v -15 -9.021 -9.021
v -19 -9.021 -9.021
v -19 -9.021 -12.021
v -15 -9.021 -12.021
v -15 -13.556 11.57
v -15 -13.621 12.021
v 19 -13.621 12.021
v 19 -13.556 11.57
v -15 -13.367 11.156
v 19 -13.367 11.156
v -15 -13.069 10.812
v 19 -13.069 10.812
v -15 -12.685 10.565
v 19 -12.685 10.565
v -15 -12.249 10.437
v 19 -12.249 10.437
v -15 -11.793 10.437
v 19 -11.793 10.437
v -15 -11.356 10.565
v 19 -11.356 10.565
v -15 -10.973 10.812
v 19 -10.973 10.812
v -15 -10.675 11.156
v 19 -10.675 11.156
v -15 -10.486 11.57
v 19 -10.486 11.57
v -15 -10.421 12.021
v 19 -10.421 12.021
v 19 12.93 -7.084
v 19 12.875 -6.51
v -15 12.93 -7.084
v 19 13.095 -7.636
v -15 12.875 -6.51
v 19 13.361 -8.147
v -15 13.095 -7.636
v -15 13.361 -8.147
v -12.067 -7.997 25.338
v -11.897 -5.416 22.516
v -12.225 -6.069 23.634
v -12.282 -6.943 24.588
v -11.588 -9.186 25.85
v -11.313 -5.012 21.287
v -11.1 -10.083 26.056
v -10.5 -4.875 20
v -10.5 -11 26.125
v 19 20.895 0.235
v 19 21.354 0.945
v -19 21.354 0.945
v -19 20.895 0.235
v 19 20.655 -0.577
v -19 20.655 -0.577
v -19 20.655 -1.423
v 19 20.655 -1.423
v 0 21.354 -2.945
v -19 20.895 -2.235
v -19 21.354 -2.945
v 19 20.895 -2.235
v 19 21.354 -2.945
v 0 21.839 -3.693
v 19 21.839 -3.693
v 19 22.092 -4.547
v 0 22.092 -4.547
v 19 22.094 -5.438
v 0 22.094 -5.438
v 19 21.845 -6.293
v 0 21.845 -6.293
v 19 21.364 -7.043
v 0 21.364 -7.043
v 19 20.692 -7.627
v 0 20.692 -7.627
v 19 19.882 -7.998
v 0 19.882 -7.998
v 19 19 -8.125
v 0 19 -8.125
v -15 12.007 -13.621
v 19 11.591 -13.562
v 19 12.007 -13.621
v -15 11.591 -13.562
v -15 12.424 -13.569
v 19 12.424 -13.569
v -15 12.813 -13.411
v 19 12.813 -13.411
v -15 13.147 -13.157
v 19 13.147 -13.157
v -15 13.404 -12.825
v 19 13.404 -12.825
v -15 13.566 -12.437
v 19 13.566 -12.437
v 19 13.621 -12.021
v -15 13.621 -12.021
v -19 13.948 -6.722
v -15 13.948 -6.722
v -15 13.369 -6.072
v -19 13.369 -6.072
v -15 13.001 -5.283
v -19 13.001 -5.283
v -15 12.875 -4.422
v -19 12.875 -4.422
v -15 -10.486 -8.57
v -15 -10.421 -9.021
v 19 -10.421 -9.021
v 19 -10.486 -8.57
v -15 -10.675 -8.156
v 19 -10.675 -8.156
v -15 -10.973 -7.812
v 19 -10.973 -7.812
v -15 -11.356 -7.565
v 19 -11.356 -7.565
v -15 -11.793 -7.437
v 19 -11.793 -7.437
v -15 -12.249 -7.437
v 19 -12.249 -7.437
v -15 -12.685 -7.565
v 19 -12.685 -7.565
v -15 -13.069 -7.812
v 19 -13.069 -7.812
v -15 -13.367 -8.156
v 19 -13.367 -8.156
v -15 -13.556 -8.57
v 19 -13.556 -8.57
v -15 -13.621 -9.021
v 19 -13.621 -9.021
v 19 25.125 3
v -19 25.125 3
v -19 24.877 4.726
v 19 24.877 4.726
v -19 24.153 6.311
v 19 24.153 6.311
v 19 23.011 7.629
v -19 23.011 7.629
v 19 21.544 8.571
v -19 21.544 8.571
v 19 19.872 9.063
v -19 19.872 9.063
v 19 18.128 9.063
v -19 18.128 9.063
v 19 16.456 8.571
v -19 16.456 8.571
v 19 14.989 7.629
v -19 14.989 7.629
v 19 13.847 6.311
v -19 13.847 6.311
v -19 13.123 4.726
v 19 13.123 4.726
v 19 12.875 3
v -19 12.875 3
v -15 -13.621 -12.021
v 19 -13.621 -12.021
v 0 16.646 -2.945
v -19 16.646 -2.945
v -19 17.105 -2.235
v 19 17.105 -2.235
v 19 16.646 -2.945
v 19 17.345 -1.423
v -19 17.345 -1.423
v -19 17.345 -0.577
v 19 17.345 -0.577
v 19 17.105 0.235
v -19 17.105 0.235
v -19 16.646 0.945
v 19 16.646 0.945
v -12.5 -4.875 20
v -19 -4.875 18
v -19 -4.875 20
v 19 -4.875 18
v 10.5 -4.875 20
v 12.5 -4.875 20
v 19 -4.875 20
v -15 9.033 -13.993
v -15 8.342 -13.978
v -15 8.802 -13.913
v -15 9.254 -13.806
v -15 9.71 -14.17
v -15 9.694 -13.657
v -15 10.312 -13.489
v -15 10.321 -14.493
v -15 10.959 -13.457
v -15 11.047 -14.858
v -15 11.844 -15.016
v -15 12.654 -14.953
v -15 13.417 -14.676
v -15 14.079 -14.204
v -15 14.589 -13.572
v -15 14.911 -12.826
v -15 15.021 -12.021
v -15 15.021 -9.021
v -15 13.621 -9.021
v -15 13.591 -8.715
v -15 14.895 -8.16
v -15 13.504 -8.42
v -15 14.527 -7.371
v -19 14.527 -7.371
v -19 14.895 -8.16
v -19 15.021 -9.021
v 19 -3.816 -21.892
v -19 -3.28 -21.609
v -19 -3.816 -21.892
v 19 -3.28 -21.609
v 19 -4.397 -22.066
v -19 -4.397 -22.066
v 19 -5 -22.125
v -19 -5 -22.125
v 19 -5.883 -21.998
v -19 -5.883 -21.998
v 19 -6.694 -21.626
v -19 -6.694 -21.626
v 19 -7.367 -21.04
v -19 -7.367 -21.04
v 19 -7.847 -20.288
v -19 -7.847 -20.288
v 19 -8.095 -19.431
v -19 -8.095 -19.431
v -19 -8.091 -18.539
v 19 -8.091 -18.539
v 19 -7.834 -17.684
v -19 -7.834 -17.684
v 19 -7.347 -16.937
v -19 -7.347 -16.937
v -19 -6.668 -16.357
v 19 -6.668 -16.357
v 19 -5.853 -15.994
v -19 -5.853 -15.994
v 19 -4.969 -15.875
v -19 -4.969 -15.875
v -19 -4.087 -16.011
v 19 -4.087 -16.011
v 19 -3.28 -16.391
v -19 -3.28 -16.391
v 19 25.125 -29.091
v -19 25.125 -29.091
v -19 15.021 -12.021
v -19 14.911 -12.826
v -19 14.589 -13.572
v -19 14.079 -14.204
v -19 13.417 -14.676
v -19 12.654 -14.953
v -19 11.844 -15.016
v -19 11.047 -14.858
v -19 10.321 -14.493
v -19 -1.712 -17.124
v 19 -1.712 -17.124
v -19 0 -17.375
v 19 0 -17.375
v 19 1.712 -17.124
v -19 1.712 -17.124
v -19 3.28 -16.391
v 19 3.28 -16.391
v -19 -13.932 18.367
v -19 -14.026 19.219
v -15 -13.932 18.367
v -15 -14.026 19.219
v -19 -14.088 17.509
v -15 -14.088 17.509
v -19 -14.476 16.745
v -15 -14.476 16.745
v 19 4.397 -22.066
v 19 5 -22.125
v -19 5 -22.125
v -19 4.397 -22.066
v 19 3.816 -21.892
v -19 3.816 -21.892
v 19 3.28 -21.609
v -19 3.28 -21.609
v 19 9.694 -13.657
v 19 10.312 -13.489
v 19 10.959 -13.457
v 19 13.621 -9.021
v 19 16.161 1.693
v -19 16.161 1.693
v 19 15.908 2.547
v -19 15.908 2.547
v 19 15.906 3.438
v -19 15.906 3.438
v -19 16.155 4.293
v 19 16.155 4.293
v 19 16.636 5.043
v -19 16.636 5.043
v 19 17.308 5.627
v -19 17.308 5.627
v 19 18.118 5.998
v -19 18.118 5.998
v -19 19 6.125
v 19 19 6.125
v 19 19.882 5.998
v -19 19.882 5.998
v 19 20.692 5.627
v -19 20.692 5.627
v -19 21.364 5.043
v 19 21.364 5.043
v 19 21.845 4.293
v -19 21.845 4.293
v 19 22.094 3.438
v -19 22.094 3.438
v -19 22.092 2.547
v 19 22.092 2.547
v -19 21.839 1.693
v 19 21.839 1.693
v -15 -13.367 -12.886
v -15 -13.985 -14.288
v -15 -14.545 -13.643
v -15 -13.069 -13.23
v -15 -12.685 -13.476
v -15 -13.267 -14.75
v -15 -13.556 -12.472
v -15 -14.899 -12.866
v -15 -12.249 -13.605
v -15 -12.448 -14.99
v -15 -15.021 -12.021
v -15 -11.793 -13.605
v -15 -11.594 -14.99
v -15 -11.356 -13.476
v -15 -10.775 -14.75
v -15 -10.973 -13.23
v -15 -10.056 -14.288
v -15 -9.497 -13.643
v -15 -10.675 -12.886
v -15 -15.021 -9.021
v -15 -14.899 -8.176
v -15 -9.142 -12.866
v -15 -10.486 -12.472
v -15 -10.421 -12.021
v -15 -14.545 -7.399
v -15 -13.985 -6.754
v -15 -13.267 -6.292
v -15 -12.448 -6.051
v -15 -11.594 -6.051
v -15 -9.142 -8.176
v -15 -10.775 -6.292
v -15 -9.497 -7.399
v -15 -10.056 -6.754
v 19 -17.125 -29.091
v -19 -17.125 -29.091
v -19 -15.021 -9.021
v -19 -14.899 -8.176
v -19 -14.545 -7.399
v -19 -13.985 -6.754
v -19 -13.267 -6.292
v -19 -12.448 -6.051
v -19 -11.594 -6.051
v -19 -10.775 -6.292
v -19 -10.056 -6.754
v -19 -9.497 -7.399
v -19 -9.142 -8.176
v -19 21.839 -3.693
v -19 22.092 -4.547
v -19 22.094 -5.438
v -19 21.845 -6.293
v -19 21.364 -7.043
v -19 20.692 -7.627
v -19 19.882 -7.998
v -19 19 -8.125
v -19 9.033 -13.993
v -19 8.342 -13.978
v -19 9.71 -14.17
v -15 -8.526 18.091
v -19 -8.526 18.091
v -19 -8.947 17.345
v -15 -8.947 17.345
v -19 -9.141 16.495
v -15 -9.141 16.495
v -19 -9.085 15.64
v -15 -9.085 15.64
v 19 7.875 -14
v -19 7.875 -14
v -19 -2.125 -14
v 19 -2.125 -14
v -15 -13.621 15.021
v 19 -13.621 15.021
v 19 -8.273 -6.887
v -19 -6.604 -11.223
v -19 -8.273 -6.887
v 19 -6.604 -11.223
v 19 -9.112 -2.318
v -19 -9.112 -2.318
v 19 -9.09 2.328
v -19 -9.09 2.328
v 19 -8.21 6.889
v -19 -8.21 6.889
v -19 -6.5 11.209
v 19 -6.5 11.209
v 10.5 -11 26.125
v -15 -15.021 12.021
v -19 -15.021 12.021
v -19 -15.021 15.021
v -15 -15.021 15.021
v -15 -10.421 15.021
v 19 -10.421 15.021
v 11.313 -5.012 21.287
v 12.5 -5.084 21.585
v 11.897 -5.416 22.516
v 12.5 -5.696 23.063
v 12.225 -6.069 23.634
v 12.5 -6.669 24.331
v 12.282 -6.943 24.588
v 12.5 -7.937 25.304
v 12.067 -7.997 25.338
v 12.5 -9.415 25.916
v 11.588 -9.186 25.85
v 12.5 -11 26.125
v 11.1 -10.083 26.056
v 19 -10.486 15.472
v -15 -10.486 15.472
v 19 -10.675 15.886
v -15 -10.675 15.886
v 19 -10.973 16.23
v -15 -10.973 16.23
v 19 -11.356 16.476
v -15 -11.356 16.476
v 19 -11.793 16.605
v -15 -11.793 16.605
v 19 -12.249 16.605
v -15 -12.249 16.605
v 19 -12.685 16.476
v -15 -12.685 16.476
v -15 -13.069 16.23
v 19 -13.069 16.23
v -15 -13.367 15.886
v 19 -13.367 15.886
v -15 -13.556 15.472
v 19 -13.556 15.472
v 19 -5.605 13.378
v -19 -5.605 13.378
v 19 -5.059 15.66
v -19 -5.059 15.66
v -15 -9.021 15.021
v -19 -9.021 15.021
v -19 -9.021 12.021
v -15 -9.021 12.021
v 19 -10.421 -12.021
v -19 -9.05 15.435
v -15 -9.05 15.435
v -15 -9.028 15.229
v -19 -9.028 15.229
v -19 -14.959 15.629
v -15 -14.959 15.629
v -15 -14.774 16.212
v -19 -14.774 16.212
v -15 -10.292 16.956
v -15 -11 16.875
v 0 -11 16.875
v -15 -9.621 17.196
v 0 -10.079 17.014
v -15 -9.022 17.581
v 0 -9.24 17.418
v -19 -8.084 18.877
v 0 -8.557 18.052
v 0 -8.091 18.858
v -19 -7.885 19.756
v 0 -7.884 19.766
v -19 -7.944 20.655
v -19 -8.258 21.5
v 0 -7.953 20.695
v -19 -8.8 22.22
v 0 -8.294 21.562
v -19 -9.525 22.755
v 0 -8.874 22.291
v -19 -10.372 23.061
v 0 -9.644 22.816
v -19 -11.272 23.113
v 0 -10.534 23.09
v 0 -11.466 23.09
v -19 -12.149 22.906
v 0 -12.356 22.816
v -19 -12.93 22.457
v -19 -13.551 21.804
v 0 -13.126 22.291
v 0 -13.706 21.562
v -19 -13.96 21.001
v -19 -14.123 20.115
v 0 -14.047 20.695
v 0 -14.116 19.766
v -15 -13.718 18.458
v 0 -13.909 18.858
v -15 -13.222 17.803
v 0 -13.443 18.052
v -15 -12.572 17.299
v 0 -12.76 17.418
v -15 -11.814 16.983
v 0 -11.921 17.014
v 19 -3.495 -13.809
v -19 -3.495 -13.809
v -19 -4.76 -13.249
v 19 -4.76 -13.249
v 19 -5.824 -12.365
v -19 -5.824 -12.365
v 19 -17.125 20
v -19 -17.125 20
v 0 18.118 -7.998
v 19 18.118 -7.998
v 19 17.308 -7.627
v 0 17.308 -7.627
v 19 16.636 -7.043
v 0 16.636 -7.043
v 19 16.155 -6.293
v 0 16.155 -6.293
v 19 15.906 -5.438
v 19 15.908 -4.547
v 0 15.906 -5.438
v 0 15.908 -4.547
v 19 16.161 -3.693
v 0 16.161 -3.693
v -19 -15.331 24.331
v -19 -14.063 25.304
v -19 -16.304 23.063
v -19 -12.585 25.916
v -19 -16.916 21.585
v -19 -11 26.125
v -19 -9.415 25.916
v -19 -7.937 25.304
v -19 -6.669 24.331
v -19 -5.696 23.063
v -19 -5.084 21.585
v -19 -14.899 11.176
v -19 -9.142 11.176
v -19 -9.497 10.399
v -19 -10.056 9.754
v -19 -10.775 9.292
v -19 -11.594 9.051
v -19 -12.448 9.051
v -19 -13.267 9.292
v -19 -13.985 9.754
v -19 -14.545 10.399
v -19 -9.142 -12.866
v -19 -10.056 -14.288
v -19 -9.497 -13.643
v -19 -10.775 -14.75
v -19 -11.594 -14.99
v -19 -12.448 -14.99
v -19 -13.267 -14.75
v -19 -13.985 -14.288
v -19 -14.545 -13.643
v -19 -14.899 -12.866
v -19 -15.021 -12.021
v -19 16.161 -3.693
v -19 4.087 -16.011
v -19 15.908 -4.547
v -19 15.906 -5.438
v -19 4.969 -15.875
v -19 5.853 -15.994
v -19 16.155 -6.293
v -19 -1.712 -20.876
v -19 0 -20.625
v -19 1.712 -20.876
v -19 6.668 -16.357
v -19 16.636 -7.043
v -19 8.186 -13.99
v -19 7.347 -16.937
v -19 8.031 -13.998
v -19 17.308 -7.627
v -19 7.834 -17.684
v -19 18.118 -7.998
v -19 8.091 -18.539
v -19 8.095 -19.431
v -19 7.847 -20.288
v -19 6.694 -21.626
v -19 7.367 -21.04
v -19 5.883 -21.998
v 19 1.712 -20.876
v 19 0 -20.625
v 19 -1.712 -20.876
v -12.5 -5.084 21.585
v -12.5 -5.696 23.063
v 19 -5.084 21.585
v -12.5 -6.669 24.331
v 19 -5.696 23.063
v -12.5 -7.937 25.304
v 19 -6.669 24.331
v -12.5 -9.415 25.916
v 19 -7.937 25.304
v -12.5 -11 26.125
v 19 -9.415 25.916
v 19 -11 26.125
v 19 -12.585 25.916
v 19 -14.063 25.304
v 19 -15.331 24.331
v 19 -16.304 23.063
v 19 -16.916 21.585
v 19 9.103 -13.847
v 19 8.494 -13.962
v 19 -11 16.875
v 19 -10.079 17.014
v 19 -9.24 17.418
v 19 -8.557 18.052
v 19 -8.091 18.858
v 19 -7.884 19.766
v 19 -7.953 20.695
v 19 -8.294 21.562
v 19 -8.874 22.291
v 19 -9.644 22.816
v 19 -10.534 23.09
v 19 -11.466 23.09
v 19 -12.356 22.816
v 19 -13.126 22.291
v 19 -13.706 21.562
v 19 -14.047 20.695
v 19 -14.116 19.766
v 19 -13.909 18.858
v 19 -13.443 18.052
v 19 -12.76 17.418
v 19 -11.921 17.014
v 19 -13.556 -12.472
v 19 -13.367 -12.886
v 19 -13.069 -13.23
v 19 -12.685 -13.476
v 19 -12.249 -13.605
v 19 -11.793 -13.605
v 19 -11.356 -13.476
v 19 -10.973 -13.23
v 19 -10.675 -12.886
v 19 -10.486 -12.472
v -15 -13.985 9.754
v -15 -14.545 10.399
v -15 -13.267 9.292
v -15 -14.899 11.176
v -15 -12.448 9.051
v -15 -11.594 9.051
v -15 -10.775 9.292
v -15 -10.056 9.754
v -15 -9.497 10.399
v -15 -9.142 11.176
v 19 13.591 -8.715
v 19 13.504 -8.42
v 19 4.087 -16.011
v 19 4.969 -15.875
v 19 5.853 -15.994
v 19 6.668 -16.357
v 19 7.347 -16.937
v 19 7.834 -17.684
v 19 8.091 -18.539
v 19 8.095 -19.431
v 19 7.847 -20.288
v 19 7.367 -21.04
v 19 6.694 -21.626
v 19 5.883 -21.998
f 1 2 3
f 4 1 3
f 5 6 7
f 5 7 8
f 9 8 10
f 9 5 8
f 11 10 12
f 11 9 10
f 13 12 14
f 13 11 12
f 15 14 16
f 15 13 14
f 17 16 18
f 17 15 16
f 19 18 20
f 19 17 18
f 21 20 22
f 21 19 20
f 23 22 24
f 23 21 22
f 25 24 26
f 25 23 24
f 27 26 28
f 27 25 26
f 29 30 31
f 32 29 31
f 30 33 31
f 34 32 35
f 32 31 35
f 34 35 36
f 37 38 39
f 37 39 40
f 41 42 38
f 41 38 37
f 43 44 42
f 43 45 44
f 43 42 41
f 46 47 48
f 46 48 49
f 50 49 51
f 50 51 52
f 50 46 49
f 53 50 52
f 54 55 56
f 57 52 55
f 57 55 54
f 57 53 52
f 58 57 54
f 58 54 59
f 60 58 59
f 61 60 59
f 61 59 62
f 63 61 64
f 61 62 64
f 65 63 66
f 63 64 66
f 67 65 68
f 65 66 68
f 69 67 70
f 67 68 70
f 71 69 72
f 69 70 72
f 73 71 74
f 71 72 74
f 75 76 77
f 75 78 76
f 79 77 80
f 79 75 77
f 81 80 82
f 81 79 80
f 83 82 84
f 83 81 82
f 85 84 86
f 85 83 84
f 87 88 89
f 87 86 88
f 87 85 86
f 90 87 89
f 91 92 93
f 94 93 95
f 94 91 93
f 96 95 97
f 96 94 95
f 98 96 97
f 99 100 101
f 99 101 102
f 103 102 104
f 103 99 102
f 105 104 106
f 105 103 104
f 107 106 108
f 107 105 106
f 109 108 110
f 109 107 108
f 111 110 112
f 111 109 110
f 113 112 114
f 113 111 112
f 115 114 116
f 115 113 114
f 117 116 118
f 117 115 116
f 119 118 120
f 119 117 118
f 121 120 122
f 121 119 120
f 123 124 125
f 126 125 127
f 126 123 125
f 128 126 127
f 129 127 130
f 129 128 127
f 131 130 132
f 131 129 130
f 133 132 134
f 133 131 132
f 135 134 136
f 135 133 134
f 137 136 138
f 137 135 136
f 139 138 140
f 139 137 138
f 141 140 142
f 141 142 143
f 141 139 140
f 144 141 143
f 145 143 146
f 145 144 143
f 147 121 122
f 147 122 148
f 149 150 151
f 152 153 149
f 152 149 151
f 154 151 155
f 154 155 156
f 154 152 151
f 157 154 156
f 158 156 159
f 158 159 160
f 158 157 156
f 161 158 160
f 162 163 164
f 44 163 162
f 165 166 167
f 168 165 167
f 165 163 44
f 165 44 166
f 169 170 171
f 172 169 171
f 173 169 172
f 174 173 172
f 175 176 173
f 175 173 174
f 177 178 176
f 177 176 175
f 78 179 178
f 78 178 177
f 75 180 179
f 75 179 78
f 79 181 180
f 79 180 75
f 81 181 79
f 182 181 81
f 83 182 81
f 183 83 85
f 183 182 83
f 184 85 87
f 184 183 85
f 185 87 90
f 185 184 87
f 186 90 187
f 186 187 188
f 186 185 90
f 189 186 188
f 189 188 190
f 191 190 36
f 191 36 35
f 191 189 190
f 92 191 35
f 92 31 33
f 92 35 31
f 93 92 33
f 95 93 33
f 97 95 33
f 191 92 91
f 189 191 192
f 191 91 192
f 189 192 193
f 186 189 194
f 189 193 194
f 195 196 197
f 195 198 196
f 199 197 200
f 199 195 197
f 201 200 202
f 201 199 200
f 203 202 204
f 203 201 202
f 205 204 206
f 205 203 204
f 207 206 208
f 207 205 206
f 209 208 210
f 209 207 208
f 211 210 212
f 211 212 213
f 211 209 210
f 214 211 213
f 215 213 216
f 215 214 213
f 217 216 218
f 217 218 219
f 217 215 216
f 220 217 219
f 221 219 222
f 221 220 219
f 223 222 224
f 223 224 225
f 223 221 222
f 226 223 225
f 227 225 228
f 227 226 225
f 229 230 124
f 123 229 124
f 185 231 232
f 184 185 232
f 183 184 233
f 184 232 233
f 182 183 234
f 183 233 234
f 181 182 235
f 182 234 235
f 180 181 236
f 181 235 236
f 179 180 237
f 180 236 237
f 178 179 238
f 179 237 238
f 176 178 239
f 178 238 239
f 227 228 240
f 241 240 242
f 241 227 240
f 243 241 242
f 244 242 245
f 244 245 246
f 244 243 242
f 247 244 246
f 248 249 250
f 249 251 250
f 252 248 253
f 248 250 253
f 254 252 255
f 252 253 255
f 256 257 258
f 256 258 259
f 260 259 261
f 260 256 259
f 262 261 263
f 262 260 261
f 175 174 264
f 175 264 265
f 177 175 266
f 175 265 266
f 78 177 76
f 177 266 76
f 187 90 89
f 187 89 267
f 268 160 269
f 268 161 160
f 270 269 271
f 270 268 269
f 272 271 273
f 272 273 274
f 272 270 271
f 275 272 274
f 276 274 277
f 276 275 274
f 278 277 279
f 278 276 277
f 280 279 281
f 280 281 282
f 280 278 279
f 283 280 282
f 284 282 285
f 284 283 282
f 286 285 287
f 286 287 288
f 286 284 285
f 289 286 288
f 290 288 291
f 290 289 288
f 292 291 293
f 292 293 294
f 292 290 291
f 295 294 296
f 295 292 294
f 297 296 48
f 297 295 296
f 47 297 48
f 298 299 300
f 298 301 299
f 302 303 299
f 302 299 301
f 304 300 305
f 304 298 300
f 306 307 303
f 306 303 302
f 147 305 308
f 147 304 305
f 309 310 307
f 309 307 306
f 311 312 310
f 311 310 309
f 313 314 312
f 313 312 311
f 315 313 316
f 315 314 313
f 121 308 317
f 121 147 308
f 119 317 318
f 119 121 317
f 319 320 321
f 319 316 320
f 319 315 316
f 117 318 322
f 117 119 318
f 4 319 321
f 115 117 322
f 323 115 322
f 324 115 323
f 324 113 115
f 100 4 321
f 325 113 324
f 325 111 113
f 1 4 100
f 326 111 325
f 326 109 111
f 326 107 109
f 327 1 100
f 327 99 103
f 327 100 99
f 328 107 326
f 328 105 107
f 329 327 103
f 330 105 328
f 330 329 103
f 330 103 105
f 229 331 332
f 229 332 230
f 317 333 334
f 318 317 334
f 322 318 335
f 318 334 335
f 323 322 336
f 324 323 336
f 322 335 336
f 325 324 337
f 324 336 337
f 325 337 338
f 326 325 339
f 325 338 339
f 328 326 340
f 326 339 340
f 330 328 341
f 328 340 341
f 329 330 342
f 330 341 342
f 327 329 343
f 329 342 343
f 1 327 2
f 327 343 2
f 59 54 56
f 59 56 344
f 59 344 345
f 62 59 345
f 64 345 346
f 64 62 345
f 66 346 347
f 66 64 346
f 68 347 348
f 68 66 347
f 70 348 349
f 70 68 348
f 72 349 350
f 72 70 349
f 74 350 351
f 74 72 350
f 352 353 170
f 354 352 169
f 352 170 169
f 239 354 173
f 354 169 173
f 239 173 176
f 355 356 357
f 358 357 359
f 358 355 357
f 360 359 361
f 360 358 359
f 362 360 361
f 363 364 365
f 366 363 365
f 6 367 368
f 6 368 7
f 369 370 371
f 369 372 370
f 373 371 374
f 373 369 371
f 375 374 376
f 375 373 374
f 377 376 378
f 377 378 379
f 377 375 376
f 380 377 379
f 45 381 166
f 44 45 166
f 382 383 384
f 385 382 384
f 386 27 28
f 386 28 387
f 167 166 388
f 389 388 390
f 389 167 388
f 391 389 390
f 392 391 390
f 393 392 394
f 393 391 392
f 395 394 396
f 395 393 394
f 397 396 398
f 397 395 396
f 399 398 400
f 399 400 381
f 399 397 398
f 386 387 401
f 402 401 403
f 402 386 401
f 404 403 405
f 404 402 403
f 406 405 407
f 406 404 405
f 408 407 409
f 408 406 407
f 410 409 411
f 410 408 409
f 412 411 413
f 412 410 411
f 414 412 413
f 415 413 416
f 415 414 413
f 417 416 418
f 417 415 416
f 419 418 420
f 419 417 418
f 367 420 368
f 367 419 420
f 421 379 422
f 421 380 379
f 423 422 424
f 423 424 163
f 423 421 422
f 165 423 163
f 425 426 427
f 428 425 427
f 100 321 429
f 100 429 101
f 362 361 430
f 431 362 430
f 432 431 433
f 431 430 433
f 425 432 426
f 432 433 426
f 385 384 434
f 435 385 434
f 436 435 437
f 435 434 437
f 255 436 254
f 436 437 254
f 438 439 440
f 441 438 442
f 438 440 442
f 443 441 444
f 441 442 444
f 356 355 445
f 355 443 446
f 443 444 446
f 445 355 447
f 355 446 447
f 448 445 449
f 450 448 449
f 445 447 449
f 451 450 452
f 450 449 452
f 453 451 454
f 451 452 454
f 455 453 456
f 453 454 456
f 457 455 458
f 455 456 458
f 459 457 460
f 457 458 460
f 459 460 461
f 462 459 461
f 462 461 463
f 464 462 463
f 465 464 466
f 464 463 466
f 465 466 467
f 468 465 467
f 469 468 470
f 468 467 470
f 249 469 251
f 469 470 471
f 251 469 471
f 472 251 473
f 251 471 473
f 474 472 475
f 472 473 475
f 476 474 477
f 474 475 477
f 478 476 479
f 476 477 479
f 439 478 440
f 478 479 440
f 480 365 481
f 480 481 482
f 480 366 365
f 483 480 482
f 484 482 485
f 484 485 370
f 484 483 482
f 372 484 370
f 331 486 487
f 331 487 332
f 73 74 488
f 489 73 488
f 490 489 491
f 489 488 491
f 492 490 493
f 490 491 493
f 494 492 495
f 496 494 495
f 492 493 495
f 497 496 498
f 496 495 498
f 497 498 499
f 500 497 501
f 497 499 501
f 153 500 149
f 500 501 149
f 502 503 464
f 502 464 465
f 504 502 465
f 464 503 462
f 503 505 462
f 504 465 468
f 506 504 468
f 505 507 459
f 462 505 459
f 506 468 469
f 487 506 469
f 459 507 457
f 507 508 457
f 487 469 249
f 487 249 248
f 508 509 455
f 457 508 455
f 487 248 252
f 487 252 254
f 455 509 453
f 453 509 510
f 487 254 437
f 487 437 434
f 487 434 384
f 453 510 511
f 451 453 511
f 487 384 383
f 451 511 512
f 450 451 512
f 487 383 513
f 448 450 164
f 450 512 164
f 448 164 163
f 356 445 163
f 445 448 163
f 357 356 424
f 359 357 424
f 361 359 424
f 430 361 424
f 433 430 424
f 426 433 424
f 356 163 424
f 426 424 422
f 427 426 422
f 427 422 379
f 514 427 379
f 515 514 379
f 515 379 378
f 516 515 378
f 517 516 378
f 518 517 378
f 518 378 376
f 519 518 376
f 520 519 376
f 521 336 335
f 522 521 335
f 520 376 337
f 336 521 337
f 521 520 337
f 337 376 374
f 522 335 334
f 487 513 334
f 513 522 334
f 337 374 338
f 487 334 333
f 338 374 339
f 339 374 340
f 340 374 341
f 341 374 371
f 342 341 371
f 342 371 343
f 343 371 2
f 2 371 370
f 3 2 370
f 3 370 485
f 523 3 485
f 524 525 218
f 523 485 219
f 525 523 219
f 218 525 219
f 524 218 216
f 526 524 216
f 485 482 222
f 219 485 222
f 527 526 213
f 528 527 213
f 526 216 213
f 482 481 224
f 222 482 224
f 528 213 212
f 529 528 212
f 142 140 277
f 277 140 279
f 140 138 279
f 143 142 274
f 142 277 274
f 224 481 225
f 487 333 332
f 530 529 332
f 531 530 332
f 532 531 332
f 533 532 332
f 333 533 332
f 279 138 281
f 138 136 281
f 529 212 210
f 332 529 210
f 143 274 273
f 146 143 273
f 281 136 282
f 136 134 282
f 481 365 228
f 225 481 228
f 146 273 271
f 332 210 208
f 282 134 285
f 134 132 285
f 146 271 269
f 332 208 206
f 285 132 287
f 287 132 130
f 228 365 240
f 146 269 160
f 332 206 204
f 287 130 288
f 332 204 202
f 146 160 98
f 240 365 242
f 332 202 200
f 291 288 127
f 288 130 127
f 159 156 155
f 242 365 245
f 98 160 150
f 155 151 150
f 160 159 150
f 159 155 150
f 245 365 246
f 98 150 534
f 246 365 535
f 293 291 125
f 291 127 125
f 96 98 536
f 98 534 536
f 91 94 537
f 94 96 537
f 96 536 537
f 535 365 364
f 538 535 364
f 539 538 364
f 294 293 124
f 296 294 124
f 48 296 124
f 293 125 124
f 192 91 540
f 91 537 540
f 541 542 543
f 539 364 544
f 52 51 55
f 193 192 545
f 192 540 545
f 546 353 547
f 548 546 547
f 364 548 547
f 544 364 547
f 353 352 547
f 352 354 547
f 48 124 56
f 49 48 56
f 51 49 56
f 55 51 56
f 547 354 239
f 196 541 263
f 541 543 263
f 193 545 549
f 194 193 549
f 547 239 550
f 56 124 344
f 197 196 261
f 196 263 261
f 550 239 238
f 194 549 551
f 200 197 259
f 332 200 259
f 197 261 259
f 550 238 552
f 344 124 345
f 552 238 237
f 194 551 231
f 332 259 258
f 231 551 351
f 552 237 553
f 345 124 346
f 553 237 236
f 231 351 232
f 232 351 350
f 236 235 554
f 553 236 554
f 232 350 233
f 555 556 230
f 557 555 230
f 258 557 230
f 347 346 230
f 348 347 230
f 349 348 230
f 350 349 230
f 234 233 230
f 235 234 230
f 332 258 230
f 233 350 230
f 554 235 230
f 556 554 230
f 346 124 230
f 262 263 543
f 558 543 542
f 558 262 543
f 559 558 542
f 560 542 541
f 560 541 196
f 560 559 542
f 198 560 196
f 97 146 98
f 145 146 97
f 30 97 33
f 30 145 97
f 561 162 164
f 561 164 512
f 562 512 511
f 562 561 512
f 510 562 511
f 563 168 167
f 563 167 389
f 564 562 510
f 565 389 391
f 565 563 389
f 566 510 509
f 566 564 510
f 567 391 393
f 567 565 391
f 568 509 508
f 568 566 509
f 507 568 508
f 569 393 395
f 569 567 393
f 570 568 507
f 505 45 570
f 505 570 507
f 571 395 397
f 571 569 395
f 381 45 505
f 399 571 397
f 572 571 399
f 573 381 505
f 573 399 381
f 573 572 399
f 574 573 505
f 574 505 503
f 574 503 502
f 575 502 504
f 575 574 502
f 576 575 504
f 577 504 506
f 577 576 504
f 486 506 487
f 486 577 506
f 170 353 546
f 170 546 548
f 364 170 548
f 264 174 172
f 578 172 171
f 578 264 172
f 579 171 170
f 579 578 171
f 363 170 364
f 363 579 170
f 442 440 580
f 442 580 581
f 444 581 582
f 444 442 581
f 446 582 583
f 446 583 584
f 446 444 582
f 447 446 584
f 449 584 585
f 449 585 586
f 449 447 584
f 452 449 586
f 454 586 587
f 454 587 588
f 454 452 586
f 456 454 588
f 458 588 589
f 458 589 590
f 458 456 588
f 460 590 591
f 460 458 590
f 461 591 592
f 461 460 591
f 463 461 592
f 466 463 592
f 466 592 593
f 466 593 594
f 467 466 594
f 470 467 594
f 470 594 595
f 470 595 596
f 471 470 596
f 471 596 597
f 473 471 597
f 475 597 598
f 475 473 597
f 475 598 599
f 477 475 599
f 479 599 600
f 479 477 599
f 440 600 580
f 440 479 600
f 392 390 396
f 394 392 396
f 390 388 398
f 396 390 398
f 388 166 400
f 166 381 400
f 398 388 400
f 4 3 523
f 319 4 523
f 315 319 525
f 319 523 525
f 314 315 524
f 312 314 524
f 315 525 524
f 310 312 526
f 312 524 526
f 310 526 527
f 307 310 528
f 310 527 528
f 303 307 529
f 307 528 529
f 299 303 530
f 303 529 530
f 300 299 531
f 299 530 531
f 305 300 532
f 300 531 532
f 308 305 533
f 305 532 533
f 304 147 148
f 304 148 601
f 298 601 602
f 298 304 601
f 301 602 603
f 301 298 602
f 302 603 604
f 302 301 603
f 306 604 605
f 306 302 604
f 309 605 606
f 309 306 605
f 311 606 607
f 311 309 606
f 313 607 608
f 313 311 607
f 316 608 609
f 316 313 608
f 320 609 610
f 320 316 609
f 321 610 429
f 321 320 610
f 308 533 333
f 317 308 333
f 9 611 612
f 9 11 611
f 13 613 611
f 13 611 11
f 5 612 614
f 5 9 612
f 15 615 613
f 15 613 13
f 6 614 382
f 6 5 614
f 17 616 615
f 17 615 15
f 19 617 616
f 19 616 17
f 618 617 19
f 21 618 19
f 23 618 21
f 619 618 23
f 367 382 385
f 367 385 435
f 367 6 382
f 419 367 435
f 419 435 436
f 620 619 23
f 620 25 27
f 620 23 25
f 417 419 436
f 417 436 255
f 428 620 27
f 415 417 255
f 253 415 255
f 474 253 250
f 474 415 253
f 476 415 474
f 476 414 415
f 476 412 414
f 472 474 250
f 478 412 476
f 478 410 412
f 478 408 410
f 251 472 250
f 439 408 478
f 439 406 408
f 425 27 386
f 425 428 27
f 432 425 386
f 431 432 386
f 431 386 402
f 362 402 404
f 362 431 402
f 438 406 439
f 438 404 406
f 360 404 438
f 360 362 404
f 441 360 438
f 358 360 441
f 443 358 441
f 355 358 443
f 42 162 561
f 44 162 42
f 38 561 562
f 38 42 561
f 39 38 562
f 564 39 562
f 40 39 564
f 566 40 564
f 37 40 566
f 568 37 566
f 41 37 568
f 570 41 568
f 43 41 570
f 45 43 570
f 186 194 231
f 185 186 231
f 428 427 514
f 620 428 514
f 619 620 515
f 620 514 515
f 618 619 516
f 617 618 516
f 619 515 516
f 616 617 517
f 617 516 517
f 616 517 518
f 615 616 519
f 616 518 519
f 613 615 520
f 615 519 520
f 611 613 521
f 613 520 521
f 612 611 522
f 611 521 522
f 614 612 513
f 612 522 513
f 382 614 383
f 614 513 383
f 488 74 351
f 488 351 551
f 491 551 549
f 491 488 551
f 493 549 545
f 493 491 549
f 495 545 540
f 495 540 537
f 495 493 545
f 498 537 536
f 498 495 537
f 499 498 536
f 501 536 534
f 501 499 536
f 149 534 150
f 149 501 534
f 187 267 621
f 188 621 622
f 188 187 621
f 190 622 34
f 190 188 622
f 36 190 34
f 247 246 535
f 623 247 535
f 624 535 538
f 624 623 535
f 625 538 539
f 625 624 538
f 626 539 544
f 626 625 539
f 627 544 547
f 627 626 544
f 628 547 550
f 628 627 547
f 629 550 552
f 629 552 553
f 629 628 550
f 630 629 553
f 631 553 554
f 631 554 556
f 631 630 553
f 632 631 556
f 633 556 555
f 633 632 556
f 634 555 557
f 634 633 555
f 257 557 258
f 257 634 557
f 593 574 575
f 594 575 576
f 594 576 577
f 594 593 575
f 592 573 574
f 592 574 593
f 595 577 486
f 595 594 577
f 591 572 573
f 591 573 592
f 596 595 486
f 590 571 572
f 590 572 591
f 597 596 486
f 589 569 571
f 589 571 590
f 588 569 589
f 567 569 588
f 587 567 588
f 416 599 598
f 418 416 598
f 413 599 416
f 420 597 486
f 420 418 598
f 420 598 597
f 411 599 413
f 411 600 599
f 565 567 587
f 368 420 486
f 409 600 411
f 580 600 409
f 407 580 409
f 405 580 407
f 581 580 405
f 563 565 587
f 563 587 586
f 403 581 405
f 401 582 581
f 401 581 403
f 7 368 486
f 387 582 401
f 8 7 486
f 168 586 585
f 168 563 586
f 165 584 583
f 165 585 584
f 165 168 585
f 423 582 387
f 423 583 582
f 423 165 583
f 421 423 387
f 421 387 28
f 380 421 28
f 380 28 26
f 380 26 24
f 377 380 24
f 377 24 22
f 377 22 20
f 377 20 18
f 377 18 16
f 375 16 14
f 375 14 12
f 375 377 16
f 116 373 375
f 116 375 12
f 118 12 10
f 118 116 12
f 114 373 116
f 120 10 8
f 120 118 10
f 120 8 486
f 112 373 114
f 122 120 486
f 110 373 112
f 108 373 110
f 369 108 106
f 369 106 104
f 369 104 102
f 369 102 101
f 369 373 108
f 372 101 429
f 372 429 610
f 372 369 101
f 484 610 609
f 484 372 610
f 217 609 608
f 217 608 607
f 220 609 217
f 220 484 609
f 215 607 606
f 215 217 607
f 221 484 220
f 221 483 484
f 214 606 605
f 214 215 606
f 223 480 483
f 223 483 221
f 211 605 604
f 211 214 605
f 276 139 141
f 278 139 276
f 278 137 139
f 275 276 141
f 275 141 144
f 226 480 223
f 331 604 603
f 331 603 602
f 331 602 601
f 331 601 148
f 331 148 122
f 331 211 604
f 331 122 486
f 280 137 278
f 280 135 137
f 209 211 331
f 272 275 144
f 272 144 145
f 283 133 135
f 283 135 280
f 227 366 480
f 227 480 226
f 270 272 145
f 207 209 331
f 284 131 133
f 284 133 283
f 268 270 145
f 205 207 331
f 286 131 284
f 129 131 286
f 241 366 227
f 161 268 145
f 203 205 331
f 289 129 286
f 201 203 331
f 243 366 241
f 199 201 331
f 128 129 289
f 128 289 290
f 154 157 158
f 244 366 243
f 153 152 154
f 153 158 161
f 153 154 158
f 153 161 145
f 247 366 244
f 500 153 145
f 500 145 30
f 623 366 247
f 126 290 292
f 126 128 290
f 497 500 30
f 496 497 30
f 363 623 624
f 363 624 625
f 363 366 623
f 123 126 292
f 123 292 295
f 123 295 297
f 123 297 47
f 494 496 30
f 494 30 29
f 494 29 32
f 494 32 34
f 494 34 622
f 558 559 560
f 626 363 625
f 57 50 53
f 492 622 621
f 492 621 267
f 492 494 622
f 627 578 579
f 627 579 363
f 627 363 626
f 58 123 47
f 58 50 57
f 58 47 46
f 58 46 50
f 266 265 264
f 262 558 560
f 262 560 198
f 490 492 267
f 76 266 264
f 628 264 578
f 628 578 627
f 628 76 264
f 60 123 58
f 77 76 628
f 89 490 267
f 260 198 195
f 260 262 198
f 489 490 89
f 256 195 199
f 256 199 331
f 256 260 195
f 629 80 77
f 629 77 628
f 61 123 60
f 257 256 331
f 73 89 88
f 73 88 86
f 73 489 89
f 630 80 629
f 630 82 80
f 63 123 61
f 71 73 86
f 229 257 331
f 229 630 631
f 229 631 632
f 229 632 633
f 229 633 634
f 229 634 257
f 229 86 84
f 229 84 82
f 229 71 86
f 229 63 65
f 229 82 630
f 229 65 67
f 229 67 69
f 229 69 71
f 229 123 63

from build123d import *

# Parameters (mm, degrees)
SKETCH1_R               = 3.125
BOSS_EXTRUDE1_DEPTH     = 19
CUT_EXTRUDE1_DEPTH      = 43.878318603
CUT_EXTRUDE1_DEPTH_BACK = 43.878318603
CUT_EXTRUDE2_START      = -19
CUT_EXTRUDE2_DEPTH      = 4
FILLET2_R               = 3
CUT_EXTRUDE6_DEPTH      = 12.5
CHAMFER1_SIZE           = 2


with BuildPart() as part:
    # Sketch1 → Boss-Extrude1 (new, symmetric)
    # profile 1 of 2: a face of its own
    with BuildSketch(Plane(origin=(0, 0, 0), x_dir=(0, 0, -1), z_dir=(1, 0, 0))):
        with BuildLine():
            ThreePointArc((-26.125, -11), (-24.331029035, -15.331029035), (-20, -17.125))
            Line((-20, -17.125), (29.090970785, -17.125))
            Line((29.090970785, -17.125), (29.090970785, 25.125))
            Line((29.090970785, 25.125), (-3, 25.125))
            ThreePointArc((-3, 25.125), (-9.125, 19), (-3, 12.875))
            Line((-3, 12.875), (9, 12.875))
            ThreePointArc((9, 12.875), (12.535533906, 11.410533906), (14, 7.875))
            Line((14, 7.875), (14, -2.125))
            ThreePointArc((14, -2.125), (13.249270274, -4.760090537), (11.222519145, -6.603884755))
            ThreePointArc((11.222519145, -6.603884755), (-0.005385096, -9.209195056), (-11.208778717, -6.500422867))
            ThreePointArc((-11.208778717, -6.500422867), (-14.508485787, -5.287014241), (-18, -4.875))
            Line((-18, -4.875), (-20, -4.875))
            Line((-20, -4.875), (-26.125, -11))
        make_face()
        with Locations((-20, -11)):
            Circle(SKETCH1_R, mode=Mode.SUBTRACT)
        with BuildLine():
            ThreePointArc((16.391055046, 3.279816514), (18.102037858, 7.993207141), (22.125, 5))
            ThreePointArc((22.125, 5), (21.993207141, 4.102037858), (21.608944954, 3.279816514))
            ThreePointArc((21.608944954, 3.279816514), (20.625, 0), (21.608944954, -3.279816514))
            ThreePointArc((21.608944954, -3.279816514), (21.993207141, -4.102037858), (22.125, -5))
            ThreePointArc((22.125, -5), (18.102037858, -7.993207141), (16.391055046, -3.279816514))
            ThreePointArc((16.391055046, -3.279816514), (17.375, 0), (16.391055046, 3.279816514))
        make_face(mode=Mode.SUBTRACT)
        with BuildLine():
            ThreePointArc((-0.945205479, 16.645547945), (-6.125, 19), (-0.945205479, 21.354452055))
            ThreePointArc((-0.945205479, 21.354452055), (1, 20.625), (2.945205479, 21.354452055))
            ThreePointArc((2.945205479, 21.354452055), (6.293134201, 21.844895242), (8.125, 19))
            ThreePointArc((8.125, 19), (6.293134201, 16.155104758), (2.945205479, 16.645547945))
            ThreePointArc((2.945205479, 16.645547945), (1, 17.375), (-0.945205479, 16.645547945))
        make_face(mode=Mode.SUBTRACT)
    # profile 2 of 2: a face of its own
    with BuildSketch(Plane(origin=(0, 0, 0), x_dir=(0, 0, -1), z_dir=(1, 0, 0))):
        with BuildLine():
            ThreePointArc((-20, -4.875), (-24.331029035, -6.668970965), (-26.125, -11))
            Line((-26.125, -11), (-20, -4.875))
        make_face()
    extrude(amount=BOSS_EXTRUDE1_DEPTH, both=True)

    # Sketch2 → Cut-Extrude1 (cut, two sides: drawn at the far end of the back side and taken through both)
    with BuildSketch(Plane(origin=(0, 0, 0), x_dir=(0, 0, -1), z_dir=(1, 0, 0)).offset(-CUT_EXTRUDE1_DEPTH_BACK)):
        with BuildLine():
            Line((-12.02081528, 13.62081528), (-15.02081528, 13.62081528))
            ThreePointArc((-15.02081528, 13.62081528), (-16.62081528, 12.02081528), (-15.02081528, 10.42081528))
            Line((-15.02081528, 10.42081528), (-12.02081528, 10.42081528))
            ThreePointArc((-12.02081528, 10.42081528), (-10.42081528, 12.02081528), (-12.02081528, 13.62081528))
        make_face()
        with BuildLine():
            Line((12.02081528, 13.62081528), (9.02081528, 13.62081528))
            ThreePointArc((9.02081528, 13.62081528), (7.42081528, 12.02081528), (9.02081528, 10.42081528))
            Line((9.02081528, 10.42081528), (12.02081528, 10.42081528))
            ThreePointArc((12.02081528, 10.42081528), (13.62081528, 12.02081528), (12.02081528, 13.62081528))
        make_face()
        with BuildLine():
            Line((12.02081528, -10.42081528), (9.02081528, -10.42081528))
            ThreePointArc((9.02081528, -10.42081528), (7.42081528, -12.02081528), (9.02081528, -13.62081528))
            Line((9.02081528, -13.62081528), (12.02081528, -13.62081528))
            ThreePointArc((12.02081528, -13.62081528), (13.62081528, -12.02081528), (12.02081528, -10.42081528))
        make_face()
        with BuildLine():
            Line((-12.02081528, -10.42081528), (-15.02081528, -10.42081528))
            ThreePointArc((-15.02081528, -10.42081528), (-16.62081528, -12.02081528), (-15.02081528, -13.62081528))
            Line((-15.02081528, -13.62081528), (-12.02081528, -13.62081528))
            ThreePointArc((-12.02081528, -13.62081528), (-10.42081528, -12.02081528), (-12.02081528, -10.42081528))
        make_face()
    extrude(amount=CUT_EXTRUDE1_DEPTH + CUT_EXTRUDE1_DEPTH_BACK, mode=Mode.SUBTRACT)

    # Sketch2<3> → Cut-Extrude2 (cut)
    # profile 1 of 4: a face of its own
    with BuildSketch(Plane(origin=(0, 0, 0), x_dir=(0, 0, -1), z_dir=(1, 0, 0)).offset(CUT_EXTRUDE2_START)):
        with BuildLine():
            Line((-12.02081528, 9.02081528), (-15.02081528, 9.02081528))
            ThreePointArc((-15.02081528, 9.02081528), (-18.02081528, 12.02081528), (-15.02081528, 15.02081528))
            Line((-15.02081528, 15.02081528), (-12.02081528, 15.02081528))
            ThreePointArc((-12.02081528, 15.02081528), (-9.02081528, 12.02081528), (-12.02081528, 9.02081528))
        make_face()
        with BuildLine():
            Line((-12.02081528, 10.42081528), (-15.02081528, 10.42081528))
            ThreePointArc((-15.02081528, 10.42081528), (-16.62081528, 12.02081528), (-15.02081528, 13.62081528))
            Line((-15.02081528, 13.62081528), (-12.02081528, 13.62081528))
            ThreePointArc((-12.02081528, 13.62081528), (-10.42081528, 12.02081528), (-12.02081528, 10.42081528))
        make_face(mode=Mode.SUBTRACT)
    # profile 2 of 4: a face of its own
    with BuildSketch(Plane(origin=(0, 0, 0), x_dir=(0, 0, -1), z_dir=(1, 0, 0)).offset(CUT_EXTRUDE2_START)):
        with BuildLine():
            Line((-12.02081528, -15.02081528), (-15.02081528, -15.02081528))
            ThreePointArc((-15.02081528, -15.02081528), (-18.02081528, -12.02081528), (-15.02081528, -9.02081528))
            Line((-15.02081528, -9.02081528), (-12.02081528, -9.02081528))
            ThreePointArc((-12.02081528, -9.02081528), (-9.02081528, -12.02081528), (-12.02081528, -15.02081528))
        make_face()
        with BuildLine():
            Line((-12.02081528, -13.62081528), (-15.02081528, -13.62081528))
            ThreePointArc((-15.02081528, -13.62081528), (-16.62081528, -12.02081528), (-15.02081528, -10.42081528))
            Line((-15.02081528, -10.42081528), (-12.02081528, -10.42081528))
            ThreePointArc((-12.02081528, -10.42081528), (-10.42081528, -12.02081528), (-12.02081528, -13.62081528))
        make_face(mode=Mode.SUBTRACT)
    # profile 3 of 4: a face of its own
    with BuildSketch(Plane(origin=(0, 0, 0), x_dir=(0, 0, -1), z_dir=(1, 0, 0)).offset(CUT_EXTRUDE2_START)):
        with BuildLine():
            Line((12.02081528, -15.02081528), (9.02081528, -15.02081528))
            ThreePointArc((9.02081528, -15.02081528), (6.02081528, -12.02081528), (9.02081528, -9.02081528))
            Line((9.02081528, -9.02081528), (12.02081528, -9.02081528))
            ThreePointArc((12.02081528, -9.02081528), (15.02081528, -12.02081528), (12.02081528, -15.02081528))
        make_face()
        with BuildLine():
            Line((12.02081528, -13.62081528), (9.02081528, -13.62081528))
            ThreePointArc((9.02081528, -13.62081528), (7.42081528, -12.02081528), (9.02081528, -10.42081528))
            Line((9.02081528, -10.42081528), (12.02081528, -10.42081528))
            ThreePointArc((12.02081528, -10.42081528), (13.62081528, -12.02081528), (12.02081528, -13.62081528))
        make_face(mode=Mode.SUBTRACT)
    # profile 4 of 4: a face of its own
    with BuildSketch(Plane(origin=(0, 0, 0), x_dir=(0, 0, -1), z_dir=(1, 0, 0)).offset(CUT_EXTRUDE2_START)):
        with BuildLine():
            Line((12.02081528, 9.02081528), (9.02081528, 9.02081528))
            ThreePointArc((9.02081528, 9.02081528), (6.02081528, 12.02081528), (9.02081528, 15.02081528))
            Line((9.02081528, 15.02081528), (12.02081528, 15.02081528))
            ThreePointArc((12.02081528, 15.02081528), (15.02081528, 12.02081528), (12.02081528, 9.02081528))
        make_face()
        with BuildLine():
            Line((12.02081528, 10.42081528), (9.02081528, 10.42081528))
            ThreePointArc((9.02081528, 10.42081528), (7.42081528, 12.02081528), (9.02081528, 13.62081528))
            Line((9.02081528, 13.62081528), (12.02081528, 13.62081528))
            ThreePointArc((12.02081528, 13.62081528), (13.62081528, 12.02081528), (12.02081528, 10.42081528))
        make_face(mode=Mode.SUBTRACT)
    extrude(amount=CUT_EXTRUDE2_DEPTH, mode=Mode.SUBTRACT)

    # Fillet2
    fillet2_edges = [part.edges().sort_by_distance(p)[0] for p in [
        (2, 10.800069224, -13.055116526),
        (-17, 9.543812481, -13.713285998),
        (-17, 12.875, -6.144990448),
        (-17, -13.199102102, 17.779735389),
        (-17, -9.851965995, 17.093517087),
        (2, 12.875, -7.667904173),
    ]]
    fillet(fillet2_edges, radius=FILLET2_R)

    # Sketch1<4> → Cut-Extrude6 (cut, symmetric)
    with BuildSketch(Plane(origin=(0, 0, 0), x_dir=(0, 0, -1), z_dir=(1, 0, 0))):
        with BuildLine():
            ThreePointArc((-20, -4.875), (-24.331029035, -6.668970965), (-26.125, -11))
            Line((-26.125, -11), (-20, -4.875))
        make_face()
    extrude(amount=CUT_EXTRUDE6_DEPTH, both=True, mode=Mode.SUBTRACT)

    # Chamfer1
    # the kernel refuses this chamfer: 2 mm, written as the material it adds along each edge
    with BuildSketch(Plane(origin=(12.5, -14.63690896, 29.76190896), x_dir=(-0.9996219169112968, -0.01944252080601336, -0.019442520806013355), z_dir=(0, 0.7071067811865475, -0.7071067811865476))) as chamfer1_piece_1_section:
        Polygon((CHAMFER1_SIZE * 0.999621916911, CHAMFER1_SIZE * 0.0274958766106), (-CHAMFER1_SIZE * 0.0274958766106, CHAMFER1_SIZE * 0.999621916911), (0, 0), align=None)
    chamfer1_piece_1 = extrude(amount=18.948790021, mode=Mode.PRIVATE)
    chamfer1_piece_1 = chamfer1_piece_1 & Plane(origin=(11.776447372, -11, 20), x_dir=(0, 0, 1), z_dir=(1, 0, 0)) * Cylinder(6.125, 46, mode=Mode.PRIVATE)
    add(chamfer1_piece_1)
    with BuildSketch(Plane(origin=(-12.5, -14.63690896, 29.76190896), x_dir=(0.9996219169112968, -0.01944252080601336, -0.019442520806013355), z_dir=(0, 0.7071067811865475, -0.7071067811865476))) as chamfer1_piece_2_section:
        Polygon((CHAMFER1_SIZE * 0.999621916911, -CHAMFER1_SIZE * 0.0274958766106), (-CHAMFER1_SIZE * 0.0274958766106, -CHAMFER1_SIZE * 0.999621916911), (0, 0), align=None)
    chamfer1_piece_2 = extrude(amount=18.948790021, mode=Mode.PRIVATE)
    chamfer1_piece_2 = chamfer1_piece_2 & Plane(origin=(-11.776447372, -11, 20), x_dir=(0, 0, 1), z_dir=(1, 0, 0)) * Cylinder(6.125, 46, mode=Mode.PRIVATE)
    add(chamfer1_piece_2)


solid = part.part
